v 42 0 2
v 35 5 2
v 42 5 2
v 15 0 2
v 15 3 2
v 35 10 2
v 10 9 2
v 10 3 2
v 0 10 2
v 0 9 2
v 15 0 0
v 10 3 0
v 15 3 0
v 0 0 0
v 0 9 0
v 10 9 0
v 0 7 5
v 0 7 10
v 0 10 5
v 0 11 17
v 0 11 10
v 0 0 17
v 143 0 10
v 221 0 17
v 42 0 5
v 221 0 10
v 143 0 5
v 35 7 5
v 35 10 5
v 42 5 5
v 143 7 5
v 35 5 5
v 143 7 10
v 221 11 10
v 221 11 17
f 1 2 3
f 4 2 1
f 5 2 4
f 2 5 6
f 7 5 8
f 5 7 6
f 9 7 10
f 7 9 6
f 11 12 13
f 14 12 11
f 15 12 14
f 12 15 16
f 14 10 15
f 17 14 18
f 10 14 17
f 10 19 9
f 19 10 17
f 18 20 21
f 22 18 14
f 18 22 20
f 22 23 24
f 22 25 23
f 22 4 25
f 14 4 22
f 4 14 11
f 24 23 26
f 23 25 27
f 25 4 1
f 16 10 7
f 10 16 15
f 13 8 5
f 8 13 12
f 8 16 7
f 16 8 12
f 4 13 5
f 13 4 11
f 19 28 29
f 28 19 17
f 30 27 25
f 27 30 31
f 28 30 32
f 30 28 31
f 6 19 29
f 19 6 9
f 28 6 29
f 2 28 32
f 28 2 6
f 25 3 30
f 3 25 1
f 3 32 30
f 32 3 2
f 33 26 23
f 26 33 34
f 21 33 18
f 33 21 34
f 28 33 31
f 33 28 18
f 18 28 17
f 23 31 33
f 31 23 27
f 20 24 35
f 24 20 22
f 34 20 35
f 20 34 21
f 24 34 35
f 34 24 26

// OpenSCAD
translate([2.5, 1.5, 1.0]) color([0.4306045068871984, 0.45460236437769275, 0.25475221651879554]) cube([5, 3, 2], center=true);
translate([2.5, 4.5, 1.0]) color([0.47565246533915095, 0.3371942584654095, 0.04223511400675217]) cube([5, 3, 2], center=true);
translate([2.5, 7.5, 1.0]) color([0.05255331220371673, 0.34980223330761895, 0.2898096938030986]) cube([5, 3, 2], center=true);
translate([7.5, 1.5, 1.0]) color([0.007130057665757694, 0.06369015415518986, 0.42774457246440645]) cube([5, 3, 2], center=true);
translate([7.5, 4.5, 1.0]) color([0.22216650821772055, 0.6086379170158094, 0.557768500755667]) cube([5, 3, 2], center=true);
translate([7.5, 7.5, 1.0]) color([0.22097295115667703, 0.19284823789822858, 0.6083188139076446]) cube([5, 3, 2], center=true);
translate([12.5, 1.5, 1.0]) color([0.606354511401297, 0.08562053587131313, 0.31903016062772993]) cube([5, 3, 2], center=true);
translate([3.5, 2.5, 3.5]) color([0.53590115499306, 0.8934753784920533, 0.25549985489866966]) cube([7, 5, 3], center=true);
translate([3.5, 7.5, 3.5]) color([0.5219903070058861, 0.1901317713313112, 0.08011594570868696]) cube([7, 5, 3], center=true);
translate([10.5, 2.5, 3.5]) color([0.8699478397109702, 0.3457472114844995, 0.837290862214726]) cube([7, 5, 3], center=true);
translate([10.5, 7.5, 3.5]) color([0.25127706432840136, 0.7290260027021367, 0.3013213449137814]) cube([7, 5, 3], center=true);
translate([17.5, 2.5, 3.5]) color([0.5169005458056509, 0.38467176448284957, 0.4820846642847386]) cube([7, 5, 3], center=true);
translate([17.5, 7.5, 3.5]) color([0.8719757028853922, 0.2399620044566907, 0.3058147052987177]) cube([7, 5, 3], center=true);
translate([24.5, 2.5, 3.5]) color([0.5519737755681405, 0.009208459116004764, 0.4953005367860557]) cube([7, 5, 3], center=true);
translate([24.5, 7.5, 3.5]) color([0.43819859659275806, 0.9171481192782721, 0.41212019308576986]) cube([7, 5, 3], center=true);
translate([31.5, 2.5, 3.5]) color([0.49358197644734136, 0.44010860560926524, 0.0856157398333921]) cube([7, 5, 3], center=true);
translate([31.5, 7.5, 3.5]) color([0.2411443971002879, 0.8262650576639278, 0.15379567752788093]) cube([7, 5, 3], center=true);
translate([38.5, 2.5, 3.5]) color([0.8842528530898255, 0.2134665283608419, 0.6127566924478359]) cube([7, 5, 3], center=true);
translate([5.5, 3.5, 7.5]) color([0.818008657000479, 0.5590112191053322, 0.8866043301622452]) cube([11, 7, 5], center=true);
translate([16.5, 3.5, 7.5]) color([0.39447102725022787, 0.9589163376419946, 0.24972819156954773]) cube([11, 7, 5], center=true);
translate([27.5, 3.5, 7.5]) color([0.22005049979750413, 0.8404590105346786, 0.2789960200671917]) cube([11, 7, 5], center=true);
translate([38.5, 3.5, 7.5]) color([0.35210354864297055, 0.9946691500756418, 0.10728537706325991]) cube([11, 7, 5], center=true);
translate([49.5, 3.5, 7.5]) color([0.8996256313138141, 0.6100819970747507, 0.7890377134172993]) cube([11, 7, 5], center=true);
translate([60.5, 3.5, 7.5]) color([0.7110679469752405, 0.7774643558396669, 0.5140354678382717]) cube([11, 7, 5], center=true);
translate([71.5, 3.5, 7.5]) color([0.46207744282607, 0.6343562920465169, 0.27254621857246664]) cube([11, 7, 5], center=true);
translate([82.5, 3.5, 7.5]) color([0.016558424522952975, 0.6148716567717017, 0.7119066573597548]) cube([11, 7, 5], center=true);
translate([93.5, 3.5, 7.5]) color([0.17257617960039529, 0.41465974039415787, 0.21806470516739018]) cube([11, 7, 5], center=true);
translate([104.5, 3.5, 7.5]) color([0.8797884787327306, 0.9971497033508181, 0.006439244314443648]) cube([11, 7, 5], center=true);
translate([115.5, 3.5, 7.5]) color([0.5355241113549698, 0.428269623660265, 0.0497703561320445]) cube([11, 7, 5], center=true);
translate([126.5, 3.5, 7.5]) color([0.3846945959716809, 0.27248481749180187, 0.9711494351721061]) cube([11, 7, 5], center=true);
translate([137.5, 3.5, 7.5]) color([0.5646669518865992, 0.22956269737245216, 0.7165492601952248]) cube([11, 7, 5], center=true);
translate([6.5, 5.5, 13.5]) color([0.5466375027642284, 0.2821670936164109, 0.7398695784196249]) cube([13, 11, 7], center=true);
translate([19.5, 5.5, 13.5]) color([0.9015687423954613, 0.06478718309218656, 0.3075184499818515]) cube([13, 11, 7], center=true);
translate([32.5, 5.5, 13.5]) color([0.32730937178137276, 0.373196919474838, 0.48026967262350795]) cube([13, 11, 7], center=true);
translate([45.5, 5.5, 13.5]) color([0.5820603979481933, 0.1372879505883815, 0.015498761483451418]) cube([13, 11, 7], center=true);
translate([58.5, 5.5, 13.5]) color([0.5048497045627587, 0.36698725510709684, 0.6348155217266559]) cube([13, 11, 7], center=true);
translate([71.5, 5.5, 13.5]) color([0.811995686067811, 0.8768405645756486, 0.1552431358080847]) cube([13, 11, 7], center=true);
translate([84.5, 5.5, 13.5]) color([0.1767648869043179, 0.991228648099722, 0.13558077637136434]) cube([13, 11, 7], center=true);
translate([97.5, 5.5, 13.5]) color([0.20650423900368708, 0.9151210693627757, 0.49673738754911745]) cube([13, 11, 7], center=true);
translate([110.5, 5.5, 13.5]) color([0.7672539256192649, 0.969306850533619, 0.23531586477578126]) cube([13, 11, 7], center=true);
translate([123.5, 5.5, 13.5]) color([0.13212860983739783, 0.23368957459901674, 0.38460662479298113]) cube([13, 11, 7], center=true);
translate([136.5, 5.5, 13.5]) color([0.6084990843462054, 0.1325407149567407, 0.4984659545183915]) cube([13, 11, 7], center=true);
translate([149.5, 5.5, 13.5]) color([0.9178662904203972, 0.6160167741323543, 0.02601445858505036]) cube([13, 11, 7], center=true);
translate([162.5, 5.5, 13.5]) color([0.596125612844632, 0.48919913512172475, 0.30869925031539414]) cube([13, 11, 7], center=true);
translate([175.5, 5.5, 13.5]) color([0.9586301909392594, 0.5555224541780607, 0.16303723797834868]) cube([13, 11, 7], center=true);
translate([188.5, 5.5, 13.5]) color([0.8790785483620981, 0.8092366229990562, 0.7373715302416316]) cube([13, 11, 7], center=true);
translate([201.5, 5.5, 13.5]) color([0.5460288399006699, 0.7042240787132147, 0.07877233817546292]) cube([13, 11, 7], center=true);
translate([214.5, 5.5, 13.5]) color([0.13744427713979768, 0.40185422229333856, 0.1910666288561843]) cube([13, 11, 7], center=true);
